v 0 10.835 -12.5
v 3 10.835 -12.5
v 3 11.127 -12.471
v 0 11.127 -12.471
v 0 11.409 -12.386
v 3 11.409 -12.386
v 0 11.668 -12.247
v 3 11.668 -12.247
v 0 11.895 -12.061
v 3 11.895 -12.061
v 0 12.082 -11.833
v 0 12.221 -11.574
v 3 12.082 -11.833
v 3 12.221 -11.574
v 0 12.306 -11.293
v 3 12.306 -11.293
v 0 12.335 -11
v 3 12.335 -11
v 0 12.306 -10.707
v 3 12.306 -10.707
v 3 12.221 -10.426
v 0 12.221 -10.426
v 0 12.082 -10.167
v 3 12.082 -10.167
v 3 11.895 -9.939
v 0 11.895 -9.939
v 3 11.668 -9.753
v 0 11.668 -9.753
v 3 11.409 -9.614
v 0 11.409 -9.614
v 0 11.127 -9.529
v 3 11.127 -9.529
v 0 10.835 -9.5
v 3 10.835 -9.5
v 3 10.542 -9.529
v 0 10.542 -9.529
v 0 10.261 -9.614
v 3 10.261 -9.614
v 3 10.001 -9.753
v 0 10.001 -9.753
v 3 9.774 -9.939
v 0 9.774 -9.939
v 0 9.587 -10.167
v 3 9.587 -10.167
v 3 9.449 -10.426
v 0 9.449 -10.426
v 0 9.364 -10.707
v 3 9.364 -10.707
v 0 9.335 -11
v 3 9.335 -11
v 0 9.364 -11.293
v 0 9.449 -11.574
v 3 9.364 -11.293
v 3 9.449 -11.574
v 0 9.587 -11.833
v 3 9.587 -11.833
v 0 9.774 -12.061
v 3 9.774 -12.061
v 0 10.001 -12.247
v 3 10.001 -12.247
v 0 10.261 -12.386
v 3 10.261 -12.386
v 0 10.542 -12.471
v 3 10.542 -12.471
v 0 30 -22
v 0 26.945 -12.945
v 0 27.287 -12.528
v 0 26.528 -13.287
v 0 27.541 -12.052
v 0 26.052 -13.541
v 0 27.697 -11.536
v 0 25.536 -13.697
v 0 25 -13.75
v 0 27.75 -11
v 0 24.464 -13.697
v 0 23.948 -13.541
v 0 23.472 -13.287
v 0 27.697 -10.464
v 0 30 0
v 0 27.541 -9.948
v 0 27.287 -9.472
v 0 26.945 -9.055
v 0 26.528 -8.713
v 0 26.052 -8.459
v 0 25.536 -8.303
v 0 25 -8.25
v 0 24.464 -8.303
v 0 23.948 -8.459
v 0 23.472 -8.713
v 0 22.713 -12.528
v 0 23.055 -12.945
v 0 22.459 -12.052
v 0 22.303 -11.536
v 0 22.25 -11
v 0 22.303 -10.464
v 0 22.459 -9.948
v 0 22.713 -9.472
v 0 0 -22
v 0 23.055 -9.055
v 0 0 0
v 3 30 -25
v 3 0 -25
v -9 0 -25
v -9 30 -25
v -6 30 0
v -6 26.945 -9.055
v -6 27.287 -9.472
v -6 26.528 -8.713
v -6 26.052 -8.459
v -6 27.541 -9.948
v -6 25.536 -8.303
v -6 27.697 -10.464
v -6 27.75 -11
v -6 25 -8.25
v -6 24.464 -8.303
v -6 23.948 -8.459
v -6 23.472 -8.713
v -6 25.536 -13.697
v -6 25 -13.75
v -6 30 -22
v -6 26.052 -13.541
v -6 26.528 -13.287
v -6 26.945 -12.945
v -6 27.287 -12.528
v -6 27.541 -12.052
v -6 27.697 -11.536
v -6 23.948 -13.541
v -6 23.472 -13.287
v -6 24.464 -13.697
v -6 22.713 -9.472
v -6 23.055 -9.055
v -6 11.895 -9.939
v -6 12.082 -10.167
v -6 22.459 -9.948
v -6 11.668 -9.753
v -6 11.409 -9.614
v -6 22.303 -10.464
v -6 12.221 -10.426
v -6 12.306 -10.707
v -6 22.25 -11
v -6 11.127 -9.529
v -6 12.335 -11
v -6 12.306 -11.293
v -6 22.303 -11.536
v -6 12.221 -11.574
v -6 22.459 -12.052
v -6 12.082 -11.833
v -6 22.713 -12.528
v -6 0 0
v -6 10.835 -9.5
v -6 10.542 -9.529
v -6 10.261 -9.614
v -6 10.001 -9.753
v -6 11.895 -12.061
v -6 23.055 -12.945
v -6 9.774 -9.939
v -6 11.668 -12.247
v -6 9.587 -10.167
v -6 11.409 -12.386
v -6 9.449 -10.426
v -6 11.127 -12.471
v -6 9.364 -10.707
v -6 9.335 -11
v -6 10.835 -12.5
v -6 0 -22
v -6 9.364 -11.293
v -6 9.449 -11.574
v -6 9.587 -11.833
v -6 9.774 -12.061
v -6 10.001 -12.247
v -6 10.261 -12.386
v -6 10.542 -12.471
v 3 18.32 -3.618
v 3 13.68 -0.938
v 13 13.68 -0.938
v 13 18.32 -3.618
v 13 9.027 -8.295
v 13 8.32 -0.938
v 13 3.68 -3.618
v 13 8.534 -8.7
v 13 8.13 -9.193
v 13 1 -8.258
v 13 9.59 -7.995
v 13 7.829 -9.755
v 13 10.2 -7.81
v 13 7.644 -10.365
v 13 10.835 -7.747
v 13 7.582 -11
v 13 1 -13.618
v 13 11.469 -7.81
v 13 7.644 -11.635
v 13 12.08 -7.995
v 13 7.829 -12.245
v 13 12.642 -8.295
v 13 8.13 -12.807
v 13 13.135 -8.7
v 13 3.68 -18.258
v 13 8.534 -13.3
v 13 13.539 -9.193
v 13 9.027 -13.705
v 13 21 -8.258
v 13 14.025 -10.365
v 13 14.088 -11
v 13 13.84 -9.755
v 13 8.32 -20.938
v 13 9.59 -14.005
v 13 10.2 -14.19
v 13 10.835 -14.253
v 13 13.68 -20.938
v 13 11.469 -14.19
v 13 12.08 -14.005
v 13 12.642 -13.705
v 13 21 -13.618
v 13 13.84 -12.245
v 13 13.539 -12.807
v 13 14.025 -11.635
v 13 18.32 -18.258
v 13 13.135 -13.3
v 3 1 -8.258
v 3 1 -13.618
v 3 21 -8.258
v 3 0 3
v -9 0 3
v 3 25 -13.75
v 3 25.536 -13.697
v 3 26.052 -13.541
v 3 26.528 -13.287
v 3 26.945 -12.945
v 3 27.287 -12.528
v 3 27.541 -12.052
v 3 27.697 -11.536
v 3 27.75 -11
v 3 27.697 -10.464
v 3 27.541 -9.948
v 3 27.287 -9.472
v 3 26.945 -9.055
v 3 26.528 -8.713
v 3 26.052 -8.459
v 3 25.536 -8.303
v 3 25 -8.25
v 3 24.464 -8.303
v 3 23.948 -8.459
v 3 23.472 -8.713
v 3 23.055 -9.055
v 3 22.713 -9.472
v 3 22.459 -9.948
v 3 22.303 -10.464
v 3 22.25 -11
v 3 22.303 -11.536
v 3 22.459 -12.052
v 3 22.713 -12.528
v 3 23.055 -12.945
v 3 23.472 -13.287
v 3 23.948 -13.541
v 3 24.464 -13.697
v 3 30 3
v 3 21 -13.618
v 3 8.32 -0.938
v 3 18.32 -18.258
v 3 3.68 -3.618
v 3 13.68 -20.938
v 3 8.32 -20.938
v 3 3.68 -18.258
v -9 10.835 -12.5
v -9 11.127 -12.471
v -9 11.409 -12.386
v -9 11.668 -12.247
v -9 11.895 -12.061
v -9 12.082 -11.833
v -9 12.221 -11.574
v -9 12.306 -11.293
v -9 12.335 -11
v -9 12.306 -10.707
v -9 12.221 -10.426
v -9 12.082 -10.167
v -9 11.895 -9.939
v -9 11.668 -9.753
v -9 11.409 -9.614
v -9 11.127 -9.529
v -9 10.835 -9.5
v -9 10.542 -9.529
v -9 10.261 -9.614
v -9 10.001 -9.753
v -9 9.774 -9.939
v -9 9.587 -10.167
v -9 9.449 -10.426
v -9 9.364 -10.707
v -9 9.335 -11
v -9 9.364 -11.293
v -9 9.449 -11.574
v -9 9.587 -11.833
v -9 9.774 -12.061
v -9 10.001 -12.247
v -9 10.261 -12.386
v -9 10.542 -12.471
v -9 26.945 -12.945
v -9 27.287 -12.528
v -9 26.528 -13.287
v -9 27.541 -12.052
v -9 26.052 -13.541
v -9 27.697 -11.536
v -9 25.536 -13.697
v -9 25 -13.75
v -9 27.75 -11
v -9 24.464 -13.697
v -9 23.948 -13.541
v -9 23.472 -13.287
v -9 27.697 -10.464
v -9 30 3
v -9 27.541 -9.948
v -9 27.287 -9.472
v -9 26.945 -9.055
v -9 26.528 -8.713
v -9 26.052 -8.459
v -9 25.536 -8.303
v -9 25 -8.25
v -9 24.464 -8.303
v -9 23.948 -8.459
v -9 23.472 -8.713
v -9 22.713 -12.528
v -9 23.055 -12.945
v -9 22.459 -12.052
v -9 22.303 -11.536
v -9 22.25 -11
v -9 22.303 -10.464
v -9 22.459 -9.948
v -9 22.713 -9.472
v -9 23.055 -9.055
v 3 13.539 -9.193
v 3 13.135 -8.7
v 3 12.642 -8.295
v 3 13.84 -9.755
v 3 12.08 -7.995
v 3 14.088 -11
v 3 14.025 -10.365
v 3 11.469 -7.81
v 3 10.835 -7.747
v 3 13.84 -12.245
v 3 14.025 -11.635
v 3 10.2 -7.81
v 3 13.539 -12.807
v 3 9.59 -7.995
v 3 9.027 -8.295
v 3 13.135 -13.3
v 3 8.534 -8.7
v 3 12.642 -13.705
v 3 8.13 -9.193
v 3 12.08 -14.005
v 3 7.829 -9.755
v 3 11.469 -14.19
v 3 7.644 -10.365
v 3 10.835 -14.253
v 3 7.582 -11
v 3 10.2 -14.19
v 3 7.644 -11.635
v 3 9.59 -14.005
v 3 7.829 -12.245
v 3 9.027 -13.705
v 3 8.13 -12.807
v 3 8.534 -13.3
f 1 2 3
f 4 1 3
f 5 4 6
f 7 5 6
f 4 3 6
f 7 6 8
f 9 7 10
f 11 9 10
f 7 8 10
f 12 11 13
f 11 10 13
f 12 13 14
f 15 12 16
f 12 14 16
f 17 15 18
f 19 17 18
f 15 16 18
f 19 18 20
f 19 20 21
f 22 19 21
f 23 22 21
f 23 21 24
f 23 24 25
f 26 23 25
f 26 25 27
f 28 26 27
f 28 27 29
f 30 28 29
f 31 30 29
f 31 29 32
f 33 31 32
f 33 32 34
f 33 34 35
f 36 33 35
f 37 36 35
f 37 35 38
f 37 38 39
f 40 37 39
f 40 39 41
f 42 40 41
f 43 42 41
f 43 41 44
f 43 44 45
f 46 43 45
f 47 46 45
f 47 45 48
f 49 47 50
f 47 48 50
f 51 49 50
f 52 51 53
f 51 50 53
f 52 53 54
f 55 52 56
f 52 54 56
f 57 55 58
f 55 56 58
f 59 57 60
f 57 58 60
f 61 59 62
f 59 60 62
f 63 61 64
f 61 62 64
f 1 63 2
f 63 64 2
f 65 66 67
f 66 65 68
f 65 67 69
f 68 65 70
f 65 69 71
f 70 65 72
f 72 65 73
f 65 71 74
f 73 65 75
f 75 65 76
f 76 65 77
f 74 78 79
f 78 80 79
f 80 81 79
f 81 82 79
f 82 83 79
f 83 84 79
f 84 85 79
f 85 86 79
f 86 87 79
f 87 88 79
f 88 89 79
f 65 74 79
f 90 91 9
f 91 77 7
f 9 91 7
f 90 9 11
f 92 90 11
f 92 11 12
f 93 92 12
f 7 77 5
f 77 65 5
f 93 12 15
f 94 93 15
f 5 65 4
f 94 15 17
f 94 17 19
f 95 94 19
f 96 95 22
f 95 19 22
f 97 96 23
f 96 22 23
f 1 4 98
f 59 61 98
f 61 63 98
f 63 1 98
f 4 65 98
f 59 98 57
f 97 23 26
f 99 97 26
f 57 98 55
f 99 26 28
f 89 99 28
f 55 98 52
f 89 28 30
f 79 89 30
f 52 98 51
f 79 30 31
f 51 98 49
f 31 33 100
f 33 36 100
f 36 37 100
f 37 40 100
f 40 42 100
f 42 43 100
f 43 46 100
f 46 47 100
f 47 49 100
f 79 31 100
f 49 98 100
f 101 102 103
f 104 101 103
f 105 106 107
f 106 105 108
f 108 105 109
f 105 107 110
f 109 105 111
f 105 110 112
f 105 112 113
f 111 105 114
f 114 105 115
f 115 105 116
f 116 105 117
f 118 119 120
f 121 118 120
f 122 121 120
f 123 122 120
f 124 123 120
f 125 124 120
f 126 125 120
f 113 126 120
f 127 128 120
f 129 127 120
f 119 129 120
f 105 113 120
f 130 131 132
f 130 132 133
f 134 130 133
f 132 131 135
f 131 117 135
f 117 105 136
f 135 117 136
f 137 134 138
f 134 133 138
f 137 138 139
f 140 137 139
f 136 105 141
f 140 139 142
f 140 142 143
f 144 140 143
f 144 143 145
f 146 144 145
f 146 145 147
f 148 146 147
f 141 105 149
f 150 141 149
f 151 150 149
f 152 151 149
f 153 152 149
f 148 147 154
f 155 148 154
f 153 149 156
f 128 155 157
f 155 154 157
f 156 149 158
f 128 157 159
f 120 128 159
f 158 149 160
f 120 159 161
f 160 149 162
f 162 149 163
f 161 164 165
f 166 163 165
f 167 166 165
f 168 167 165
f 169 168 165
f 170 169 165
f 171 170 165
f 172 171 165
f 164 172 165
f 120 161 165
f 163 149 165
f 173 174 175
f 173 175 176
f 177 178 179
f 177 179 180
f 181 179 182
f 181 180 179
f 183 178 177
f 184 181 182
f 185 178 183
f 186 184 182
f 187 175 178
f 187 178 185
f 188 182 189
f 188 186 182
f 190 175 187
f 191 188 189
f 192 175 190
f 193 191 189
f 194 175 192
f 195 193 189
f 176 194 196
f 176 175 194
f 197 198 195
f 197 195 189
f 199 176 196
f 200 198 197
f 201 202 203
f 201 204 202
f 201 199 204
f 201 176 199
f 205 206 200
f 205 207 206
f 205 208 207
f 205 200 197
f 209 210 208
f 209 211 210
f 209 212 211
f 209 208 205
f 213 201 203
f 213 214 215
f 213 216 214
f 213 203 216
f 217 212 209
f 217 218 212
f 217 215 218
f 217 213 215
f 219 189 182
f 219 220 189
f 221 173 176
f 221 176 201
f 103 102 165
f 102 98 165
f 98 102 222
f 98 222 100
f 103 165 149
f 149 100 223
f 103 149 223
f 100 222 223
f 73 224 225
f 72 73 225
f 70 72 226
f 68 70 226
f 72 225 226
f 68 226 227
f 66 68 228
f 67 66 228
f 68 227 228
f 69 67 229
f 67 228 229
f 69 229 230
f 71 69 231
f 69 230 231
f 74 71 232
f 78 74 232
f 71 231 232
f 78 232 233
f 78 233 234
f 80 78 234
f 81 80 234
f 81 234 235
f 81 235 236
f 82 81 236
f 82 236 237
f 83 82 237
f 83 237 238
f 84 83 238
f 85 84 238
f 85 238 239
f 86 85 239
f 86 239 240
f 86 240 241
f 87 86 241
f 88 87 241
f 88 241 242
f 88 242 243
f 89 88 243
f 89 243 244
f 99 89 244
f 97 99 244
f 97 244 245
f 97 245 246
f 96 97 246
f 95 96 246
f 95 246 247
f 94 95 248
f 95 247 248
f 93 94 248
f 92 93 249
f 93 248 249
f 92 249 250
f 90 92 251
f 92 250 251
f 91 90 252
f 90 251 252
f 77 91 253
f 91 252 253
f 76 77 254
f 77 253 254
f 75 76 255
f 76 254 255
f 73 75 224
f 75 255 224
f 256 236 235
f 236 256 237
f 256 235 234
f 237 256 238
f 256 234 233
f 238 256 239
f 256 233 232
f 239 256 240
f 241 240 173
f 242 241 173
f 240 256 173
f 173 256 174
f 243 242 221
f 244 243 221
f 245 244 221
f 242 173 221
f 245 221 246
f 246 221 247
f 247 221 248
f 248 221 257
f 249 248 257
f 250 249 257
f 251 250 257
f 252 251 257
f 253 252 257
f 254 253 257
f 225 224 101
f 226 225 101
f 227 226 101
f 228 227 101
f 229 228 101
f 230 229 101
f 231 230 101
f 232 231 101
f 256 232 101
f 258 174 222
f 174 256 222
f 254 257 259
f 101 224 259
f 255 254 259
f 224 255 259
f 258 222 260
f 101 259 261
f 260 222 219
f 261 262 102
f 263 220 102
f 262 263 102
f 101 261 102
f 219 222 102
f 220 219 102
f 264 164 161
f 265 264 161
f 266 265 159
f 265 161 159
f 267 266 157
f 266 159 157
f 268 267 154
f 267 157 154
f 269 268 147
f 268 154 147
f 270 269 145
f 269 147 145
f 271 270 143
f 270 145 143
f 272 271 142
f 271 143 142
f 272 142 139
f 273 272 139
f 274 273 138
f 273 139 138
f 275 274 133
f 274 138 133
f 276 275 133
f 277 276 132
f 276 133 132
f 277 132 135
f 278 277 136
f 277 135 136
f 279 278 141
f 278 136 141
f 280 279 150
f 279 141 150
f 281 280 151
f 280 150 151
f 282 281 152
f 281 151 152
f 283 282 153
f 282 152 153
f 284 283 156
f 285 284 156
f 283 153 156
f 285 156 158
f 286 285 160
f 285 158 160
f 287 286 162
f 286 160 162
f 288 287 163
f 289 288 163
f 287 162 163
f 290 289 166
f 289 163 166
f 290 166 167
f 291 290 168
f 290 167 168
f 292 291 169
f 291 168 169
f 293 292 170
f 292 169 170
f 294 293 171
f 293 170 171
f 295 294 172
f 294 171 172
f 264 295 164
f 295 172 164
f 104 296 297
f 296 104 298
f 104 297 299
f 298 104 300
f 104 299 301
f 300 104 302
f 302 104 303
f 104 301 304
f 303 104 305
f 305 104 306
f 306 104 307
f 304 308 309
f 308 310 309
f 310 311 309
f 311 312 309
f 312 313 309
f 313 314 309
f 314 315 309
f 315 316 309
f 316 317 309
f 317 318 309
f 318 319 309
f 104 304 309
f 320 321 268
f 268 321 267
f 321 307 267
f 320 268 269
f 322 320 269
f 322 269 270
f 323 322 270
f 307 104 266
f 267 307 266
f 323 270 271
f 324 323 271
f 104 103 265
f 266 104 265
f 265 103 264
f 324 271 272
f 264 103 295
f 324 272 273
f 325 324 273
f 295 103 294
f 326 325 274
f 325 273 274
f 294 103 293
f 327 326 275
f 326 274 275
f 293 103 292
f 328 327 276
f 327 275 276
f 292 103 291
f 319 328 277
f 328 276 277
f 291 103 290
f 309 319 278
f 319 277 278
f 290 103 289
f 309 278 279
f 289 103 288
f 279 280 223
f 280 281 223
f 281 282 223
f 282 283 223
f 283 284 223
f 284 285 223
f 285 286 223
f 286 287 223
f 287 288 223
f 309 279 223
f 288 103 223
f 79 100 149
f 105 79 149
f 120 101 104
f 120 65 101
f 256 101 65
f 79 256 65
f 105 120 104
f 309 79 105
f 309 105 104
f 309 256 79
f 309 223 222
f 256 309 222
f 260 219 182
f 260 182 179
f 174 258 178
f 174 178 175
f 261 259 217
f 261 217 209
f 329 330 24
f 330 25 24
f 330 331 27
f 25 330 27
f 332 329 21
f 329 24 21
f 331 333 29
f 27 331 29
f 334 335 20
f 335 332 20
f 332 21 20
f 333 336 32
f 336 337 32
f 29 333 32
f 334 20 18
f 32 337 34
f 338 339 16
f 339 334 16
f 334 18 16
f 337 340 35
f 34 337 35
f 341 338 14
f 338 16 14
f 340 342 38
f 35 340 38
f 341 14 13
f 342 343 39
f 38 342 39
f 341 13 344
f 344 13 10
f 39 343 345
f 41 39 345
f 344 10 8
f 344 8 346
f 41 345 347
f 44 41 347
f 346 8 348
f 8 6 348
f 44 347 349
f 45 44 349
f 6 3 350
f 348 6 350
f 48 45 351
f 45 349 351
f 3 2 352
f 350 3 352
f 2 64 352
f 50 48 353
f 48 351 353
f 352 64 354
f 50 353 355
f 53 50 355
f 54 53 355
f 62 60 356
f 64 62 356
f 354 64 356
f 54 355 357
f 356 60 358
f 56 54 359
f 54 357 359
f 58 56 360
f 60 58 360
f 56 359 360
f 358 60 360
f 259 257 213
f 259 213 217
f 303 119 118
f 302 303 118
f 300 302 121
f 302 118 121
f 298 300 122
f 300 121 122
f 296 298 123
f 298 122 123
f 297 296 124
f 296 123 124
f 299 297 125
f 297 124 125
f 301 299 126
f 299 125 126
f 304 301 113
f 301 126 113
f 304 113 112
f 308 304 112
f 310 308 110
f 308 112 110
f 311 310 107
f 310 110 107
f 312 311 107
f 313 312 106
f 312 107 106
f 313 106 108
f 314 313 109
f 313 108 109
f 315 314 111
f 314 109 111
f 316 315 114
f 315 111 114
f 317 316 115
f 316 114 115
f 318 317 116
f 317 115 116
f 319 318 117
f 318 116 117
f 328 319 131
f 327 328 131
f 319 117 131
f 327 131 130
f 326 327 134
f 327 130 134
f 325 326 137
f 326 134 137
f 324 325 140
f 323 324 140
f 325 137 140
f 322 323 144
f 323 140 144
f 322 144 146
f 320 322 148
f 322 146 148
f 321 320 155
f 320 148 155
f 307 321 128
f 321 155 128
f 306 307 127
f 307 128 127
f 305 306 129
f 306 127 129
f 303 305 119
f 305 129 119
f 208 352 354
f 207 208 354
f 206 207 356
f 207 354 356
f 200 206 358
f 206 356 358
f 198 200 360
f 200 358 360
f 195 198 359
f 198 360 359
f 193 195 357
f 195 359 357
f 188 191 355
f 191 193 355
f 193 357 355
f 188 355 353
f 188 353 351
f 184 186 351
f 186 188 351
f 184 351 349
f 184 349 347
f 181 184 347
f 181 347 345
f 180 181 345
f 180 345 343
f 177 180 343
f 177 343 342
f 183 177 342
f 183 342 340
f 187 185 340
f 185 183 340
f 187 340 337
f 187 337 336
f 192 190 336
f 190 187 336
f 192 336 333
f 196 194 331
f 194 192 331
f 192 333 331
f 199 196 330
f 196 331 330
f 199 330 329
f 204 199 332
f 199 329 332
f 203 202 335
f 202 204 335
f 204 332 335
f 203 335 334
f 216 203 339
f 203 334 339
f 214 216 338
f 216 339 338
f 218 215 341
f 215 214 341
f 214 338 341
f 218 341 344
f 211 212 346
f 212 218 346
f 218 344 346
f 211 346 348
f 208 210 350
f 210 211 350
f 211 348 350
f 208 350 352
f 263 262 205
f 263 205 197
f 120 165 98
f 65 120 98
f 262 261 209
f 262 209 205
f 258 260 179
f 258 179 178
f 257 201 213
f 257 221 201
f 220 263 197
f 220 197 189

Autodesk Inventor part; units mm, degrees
ref_plane "YZ Plane" through (0, 0, 0) normal (1, 0, 0) x (0, 1, 0)
ref_plane "XZ Plane" through (0, 0, 0) normal (0, 1, 0) x (-1, 0, 0)
ref_plane "XY Plane" through (0, 0, 0) normal (0, 0, 1) x (1, 0, 0)
sketch "Sketch1" plane through (0, 0, 0) normal (0, 1, 0) x (-1, 0, 0)
  line L0 (0, 0) -> (6, 0)
  line L1 (6, 0) -> (6, -22)
  line L2 (6, -22) -> (0, -22)
  line L3 (0, -22) -> (0, 0)
  line L4 (9, 3) -> (-3, 3)
  line L5 (-3, 3) -> (-3, -25)
  line L6 (-3, -25) -> (9, -25)
  line L7 (9, -25) -> (9, 3)
  point P0 (3, 0)
  point P1 (3, -25)
  dimension "d0" = 22
  dimension "d1" = 6
  dimension "d2" = 3
  dimension "d3" = 3
  dimension "d4" = 3
  dimension "d5" = 3
extrude "Extrusion1" add sketch "Sketch1" along normal blind 30
sketch "Sketch2" plane through (3, 0, 3) normal (1, 0, 0) x (0, 0, -1)
  circle A0 centre (14, 25) radius 2.75
  line L0 (0, 30) -> (28, 30) projected
  point P0 (3, 0)
  dimension "d8" = 5.5
  dimension "d11" = 5
extrude "Extrusion2" cut sketch "Sketch2" against normal blind 30
sketch "Sketch3" plane through (3, 0, 3) normal (1, 0, 0) x (0, 0, -1)
  line L0 (6.6175, 3.6795) -> (3.938, 8.3205)
  line L1 (3.938, 8.3205) -> (3.938, 13.6795)
  line L2 (3.938, 13.6795) -> (6.6175, 18.3205)
  line L3 (6.6175, 18.3205) -> (11.2585, 21)
  line L4 (11.2585, 21) -> (16.6175, 21)
  line L5 (16.6175, 21) -> (21.2585, 18.3205)
  line L6 (21.2585, 18.3205) -> (23.938, 13.6795)
  line L7 (23.938, 13.6795) -> (23.938, 8.3205)
  line L8 (23.938, 8.3205) -> (21.2585, 3.6795)
  line L9 (21.2585, 3.6795) -> (16.6175, 1)
  line L10 (16.6175, 1) -> (11.2585, 1)
  line L11 (11.2585, 1) -> (6.6175, 3.6795)
  line L12 (0, 30) -> (28, 30) projected
  circle A0 centre (14, 10.8347) radius 3.253
  point P0 (3, 0)
  point P1 (13.938, 11)
  dimension "d12" = 10
  dimension "d13" = 19
extrude "Extrusion3" add sketch "Sketch3" along normal blind 10
sketch "Sketch5" plane through (3, 10.8347, -11) normal (1, 0, 0) x (0, 0, -1)
  circle A0 centre (0, 0) radius 1.5
  point P0 (-11, -10.8347)
  dimension "d18" = 3
extrude "Extrusion5" cut sketch "Sketch5" against normal blind 12
properties part number "RollX" material "Thermoplastic Resin"
